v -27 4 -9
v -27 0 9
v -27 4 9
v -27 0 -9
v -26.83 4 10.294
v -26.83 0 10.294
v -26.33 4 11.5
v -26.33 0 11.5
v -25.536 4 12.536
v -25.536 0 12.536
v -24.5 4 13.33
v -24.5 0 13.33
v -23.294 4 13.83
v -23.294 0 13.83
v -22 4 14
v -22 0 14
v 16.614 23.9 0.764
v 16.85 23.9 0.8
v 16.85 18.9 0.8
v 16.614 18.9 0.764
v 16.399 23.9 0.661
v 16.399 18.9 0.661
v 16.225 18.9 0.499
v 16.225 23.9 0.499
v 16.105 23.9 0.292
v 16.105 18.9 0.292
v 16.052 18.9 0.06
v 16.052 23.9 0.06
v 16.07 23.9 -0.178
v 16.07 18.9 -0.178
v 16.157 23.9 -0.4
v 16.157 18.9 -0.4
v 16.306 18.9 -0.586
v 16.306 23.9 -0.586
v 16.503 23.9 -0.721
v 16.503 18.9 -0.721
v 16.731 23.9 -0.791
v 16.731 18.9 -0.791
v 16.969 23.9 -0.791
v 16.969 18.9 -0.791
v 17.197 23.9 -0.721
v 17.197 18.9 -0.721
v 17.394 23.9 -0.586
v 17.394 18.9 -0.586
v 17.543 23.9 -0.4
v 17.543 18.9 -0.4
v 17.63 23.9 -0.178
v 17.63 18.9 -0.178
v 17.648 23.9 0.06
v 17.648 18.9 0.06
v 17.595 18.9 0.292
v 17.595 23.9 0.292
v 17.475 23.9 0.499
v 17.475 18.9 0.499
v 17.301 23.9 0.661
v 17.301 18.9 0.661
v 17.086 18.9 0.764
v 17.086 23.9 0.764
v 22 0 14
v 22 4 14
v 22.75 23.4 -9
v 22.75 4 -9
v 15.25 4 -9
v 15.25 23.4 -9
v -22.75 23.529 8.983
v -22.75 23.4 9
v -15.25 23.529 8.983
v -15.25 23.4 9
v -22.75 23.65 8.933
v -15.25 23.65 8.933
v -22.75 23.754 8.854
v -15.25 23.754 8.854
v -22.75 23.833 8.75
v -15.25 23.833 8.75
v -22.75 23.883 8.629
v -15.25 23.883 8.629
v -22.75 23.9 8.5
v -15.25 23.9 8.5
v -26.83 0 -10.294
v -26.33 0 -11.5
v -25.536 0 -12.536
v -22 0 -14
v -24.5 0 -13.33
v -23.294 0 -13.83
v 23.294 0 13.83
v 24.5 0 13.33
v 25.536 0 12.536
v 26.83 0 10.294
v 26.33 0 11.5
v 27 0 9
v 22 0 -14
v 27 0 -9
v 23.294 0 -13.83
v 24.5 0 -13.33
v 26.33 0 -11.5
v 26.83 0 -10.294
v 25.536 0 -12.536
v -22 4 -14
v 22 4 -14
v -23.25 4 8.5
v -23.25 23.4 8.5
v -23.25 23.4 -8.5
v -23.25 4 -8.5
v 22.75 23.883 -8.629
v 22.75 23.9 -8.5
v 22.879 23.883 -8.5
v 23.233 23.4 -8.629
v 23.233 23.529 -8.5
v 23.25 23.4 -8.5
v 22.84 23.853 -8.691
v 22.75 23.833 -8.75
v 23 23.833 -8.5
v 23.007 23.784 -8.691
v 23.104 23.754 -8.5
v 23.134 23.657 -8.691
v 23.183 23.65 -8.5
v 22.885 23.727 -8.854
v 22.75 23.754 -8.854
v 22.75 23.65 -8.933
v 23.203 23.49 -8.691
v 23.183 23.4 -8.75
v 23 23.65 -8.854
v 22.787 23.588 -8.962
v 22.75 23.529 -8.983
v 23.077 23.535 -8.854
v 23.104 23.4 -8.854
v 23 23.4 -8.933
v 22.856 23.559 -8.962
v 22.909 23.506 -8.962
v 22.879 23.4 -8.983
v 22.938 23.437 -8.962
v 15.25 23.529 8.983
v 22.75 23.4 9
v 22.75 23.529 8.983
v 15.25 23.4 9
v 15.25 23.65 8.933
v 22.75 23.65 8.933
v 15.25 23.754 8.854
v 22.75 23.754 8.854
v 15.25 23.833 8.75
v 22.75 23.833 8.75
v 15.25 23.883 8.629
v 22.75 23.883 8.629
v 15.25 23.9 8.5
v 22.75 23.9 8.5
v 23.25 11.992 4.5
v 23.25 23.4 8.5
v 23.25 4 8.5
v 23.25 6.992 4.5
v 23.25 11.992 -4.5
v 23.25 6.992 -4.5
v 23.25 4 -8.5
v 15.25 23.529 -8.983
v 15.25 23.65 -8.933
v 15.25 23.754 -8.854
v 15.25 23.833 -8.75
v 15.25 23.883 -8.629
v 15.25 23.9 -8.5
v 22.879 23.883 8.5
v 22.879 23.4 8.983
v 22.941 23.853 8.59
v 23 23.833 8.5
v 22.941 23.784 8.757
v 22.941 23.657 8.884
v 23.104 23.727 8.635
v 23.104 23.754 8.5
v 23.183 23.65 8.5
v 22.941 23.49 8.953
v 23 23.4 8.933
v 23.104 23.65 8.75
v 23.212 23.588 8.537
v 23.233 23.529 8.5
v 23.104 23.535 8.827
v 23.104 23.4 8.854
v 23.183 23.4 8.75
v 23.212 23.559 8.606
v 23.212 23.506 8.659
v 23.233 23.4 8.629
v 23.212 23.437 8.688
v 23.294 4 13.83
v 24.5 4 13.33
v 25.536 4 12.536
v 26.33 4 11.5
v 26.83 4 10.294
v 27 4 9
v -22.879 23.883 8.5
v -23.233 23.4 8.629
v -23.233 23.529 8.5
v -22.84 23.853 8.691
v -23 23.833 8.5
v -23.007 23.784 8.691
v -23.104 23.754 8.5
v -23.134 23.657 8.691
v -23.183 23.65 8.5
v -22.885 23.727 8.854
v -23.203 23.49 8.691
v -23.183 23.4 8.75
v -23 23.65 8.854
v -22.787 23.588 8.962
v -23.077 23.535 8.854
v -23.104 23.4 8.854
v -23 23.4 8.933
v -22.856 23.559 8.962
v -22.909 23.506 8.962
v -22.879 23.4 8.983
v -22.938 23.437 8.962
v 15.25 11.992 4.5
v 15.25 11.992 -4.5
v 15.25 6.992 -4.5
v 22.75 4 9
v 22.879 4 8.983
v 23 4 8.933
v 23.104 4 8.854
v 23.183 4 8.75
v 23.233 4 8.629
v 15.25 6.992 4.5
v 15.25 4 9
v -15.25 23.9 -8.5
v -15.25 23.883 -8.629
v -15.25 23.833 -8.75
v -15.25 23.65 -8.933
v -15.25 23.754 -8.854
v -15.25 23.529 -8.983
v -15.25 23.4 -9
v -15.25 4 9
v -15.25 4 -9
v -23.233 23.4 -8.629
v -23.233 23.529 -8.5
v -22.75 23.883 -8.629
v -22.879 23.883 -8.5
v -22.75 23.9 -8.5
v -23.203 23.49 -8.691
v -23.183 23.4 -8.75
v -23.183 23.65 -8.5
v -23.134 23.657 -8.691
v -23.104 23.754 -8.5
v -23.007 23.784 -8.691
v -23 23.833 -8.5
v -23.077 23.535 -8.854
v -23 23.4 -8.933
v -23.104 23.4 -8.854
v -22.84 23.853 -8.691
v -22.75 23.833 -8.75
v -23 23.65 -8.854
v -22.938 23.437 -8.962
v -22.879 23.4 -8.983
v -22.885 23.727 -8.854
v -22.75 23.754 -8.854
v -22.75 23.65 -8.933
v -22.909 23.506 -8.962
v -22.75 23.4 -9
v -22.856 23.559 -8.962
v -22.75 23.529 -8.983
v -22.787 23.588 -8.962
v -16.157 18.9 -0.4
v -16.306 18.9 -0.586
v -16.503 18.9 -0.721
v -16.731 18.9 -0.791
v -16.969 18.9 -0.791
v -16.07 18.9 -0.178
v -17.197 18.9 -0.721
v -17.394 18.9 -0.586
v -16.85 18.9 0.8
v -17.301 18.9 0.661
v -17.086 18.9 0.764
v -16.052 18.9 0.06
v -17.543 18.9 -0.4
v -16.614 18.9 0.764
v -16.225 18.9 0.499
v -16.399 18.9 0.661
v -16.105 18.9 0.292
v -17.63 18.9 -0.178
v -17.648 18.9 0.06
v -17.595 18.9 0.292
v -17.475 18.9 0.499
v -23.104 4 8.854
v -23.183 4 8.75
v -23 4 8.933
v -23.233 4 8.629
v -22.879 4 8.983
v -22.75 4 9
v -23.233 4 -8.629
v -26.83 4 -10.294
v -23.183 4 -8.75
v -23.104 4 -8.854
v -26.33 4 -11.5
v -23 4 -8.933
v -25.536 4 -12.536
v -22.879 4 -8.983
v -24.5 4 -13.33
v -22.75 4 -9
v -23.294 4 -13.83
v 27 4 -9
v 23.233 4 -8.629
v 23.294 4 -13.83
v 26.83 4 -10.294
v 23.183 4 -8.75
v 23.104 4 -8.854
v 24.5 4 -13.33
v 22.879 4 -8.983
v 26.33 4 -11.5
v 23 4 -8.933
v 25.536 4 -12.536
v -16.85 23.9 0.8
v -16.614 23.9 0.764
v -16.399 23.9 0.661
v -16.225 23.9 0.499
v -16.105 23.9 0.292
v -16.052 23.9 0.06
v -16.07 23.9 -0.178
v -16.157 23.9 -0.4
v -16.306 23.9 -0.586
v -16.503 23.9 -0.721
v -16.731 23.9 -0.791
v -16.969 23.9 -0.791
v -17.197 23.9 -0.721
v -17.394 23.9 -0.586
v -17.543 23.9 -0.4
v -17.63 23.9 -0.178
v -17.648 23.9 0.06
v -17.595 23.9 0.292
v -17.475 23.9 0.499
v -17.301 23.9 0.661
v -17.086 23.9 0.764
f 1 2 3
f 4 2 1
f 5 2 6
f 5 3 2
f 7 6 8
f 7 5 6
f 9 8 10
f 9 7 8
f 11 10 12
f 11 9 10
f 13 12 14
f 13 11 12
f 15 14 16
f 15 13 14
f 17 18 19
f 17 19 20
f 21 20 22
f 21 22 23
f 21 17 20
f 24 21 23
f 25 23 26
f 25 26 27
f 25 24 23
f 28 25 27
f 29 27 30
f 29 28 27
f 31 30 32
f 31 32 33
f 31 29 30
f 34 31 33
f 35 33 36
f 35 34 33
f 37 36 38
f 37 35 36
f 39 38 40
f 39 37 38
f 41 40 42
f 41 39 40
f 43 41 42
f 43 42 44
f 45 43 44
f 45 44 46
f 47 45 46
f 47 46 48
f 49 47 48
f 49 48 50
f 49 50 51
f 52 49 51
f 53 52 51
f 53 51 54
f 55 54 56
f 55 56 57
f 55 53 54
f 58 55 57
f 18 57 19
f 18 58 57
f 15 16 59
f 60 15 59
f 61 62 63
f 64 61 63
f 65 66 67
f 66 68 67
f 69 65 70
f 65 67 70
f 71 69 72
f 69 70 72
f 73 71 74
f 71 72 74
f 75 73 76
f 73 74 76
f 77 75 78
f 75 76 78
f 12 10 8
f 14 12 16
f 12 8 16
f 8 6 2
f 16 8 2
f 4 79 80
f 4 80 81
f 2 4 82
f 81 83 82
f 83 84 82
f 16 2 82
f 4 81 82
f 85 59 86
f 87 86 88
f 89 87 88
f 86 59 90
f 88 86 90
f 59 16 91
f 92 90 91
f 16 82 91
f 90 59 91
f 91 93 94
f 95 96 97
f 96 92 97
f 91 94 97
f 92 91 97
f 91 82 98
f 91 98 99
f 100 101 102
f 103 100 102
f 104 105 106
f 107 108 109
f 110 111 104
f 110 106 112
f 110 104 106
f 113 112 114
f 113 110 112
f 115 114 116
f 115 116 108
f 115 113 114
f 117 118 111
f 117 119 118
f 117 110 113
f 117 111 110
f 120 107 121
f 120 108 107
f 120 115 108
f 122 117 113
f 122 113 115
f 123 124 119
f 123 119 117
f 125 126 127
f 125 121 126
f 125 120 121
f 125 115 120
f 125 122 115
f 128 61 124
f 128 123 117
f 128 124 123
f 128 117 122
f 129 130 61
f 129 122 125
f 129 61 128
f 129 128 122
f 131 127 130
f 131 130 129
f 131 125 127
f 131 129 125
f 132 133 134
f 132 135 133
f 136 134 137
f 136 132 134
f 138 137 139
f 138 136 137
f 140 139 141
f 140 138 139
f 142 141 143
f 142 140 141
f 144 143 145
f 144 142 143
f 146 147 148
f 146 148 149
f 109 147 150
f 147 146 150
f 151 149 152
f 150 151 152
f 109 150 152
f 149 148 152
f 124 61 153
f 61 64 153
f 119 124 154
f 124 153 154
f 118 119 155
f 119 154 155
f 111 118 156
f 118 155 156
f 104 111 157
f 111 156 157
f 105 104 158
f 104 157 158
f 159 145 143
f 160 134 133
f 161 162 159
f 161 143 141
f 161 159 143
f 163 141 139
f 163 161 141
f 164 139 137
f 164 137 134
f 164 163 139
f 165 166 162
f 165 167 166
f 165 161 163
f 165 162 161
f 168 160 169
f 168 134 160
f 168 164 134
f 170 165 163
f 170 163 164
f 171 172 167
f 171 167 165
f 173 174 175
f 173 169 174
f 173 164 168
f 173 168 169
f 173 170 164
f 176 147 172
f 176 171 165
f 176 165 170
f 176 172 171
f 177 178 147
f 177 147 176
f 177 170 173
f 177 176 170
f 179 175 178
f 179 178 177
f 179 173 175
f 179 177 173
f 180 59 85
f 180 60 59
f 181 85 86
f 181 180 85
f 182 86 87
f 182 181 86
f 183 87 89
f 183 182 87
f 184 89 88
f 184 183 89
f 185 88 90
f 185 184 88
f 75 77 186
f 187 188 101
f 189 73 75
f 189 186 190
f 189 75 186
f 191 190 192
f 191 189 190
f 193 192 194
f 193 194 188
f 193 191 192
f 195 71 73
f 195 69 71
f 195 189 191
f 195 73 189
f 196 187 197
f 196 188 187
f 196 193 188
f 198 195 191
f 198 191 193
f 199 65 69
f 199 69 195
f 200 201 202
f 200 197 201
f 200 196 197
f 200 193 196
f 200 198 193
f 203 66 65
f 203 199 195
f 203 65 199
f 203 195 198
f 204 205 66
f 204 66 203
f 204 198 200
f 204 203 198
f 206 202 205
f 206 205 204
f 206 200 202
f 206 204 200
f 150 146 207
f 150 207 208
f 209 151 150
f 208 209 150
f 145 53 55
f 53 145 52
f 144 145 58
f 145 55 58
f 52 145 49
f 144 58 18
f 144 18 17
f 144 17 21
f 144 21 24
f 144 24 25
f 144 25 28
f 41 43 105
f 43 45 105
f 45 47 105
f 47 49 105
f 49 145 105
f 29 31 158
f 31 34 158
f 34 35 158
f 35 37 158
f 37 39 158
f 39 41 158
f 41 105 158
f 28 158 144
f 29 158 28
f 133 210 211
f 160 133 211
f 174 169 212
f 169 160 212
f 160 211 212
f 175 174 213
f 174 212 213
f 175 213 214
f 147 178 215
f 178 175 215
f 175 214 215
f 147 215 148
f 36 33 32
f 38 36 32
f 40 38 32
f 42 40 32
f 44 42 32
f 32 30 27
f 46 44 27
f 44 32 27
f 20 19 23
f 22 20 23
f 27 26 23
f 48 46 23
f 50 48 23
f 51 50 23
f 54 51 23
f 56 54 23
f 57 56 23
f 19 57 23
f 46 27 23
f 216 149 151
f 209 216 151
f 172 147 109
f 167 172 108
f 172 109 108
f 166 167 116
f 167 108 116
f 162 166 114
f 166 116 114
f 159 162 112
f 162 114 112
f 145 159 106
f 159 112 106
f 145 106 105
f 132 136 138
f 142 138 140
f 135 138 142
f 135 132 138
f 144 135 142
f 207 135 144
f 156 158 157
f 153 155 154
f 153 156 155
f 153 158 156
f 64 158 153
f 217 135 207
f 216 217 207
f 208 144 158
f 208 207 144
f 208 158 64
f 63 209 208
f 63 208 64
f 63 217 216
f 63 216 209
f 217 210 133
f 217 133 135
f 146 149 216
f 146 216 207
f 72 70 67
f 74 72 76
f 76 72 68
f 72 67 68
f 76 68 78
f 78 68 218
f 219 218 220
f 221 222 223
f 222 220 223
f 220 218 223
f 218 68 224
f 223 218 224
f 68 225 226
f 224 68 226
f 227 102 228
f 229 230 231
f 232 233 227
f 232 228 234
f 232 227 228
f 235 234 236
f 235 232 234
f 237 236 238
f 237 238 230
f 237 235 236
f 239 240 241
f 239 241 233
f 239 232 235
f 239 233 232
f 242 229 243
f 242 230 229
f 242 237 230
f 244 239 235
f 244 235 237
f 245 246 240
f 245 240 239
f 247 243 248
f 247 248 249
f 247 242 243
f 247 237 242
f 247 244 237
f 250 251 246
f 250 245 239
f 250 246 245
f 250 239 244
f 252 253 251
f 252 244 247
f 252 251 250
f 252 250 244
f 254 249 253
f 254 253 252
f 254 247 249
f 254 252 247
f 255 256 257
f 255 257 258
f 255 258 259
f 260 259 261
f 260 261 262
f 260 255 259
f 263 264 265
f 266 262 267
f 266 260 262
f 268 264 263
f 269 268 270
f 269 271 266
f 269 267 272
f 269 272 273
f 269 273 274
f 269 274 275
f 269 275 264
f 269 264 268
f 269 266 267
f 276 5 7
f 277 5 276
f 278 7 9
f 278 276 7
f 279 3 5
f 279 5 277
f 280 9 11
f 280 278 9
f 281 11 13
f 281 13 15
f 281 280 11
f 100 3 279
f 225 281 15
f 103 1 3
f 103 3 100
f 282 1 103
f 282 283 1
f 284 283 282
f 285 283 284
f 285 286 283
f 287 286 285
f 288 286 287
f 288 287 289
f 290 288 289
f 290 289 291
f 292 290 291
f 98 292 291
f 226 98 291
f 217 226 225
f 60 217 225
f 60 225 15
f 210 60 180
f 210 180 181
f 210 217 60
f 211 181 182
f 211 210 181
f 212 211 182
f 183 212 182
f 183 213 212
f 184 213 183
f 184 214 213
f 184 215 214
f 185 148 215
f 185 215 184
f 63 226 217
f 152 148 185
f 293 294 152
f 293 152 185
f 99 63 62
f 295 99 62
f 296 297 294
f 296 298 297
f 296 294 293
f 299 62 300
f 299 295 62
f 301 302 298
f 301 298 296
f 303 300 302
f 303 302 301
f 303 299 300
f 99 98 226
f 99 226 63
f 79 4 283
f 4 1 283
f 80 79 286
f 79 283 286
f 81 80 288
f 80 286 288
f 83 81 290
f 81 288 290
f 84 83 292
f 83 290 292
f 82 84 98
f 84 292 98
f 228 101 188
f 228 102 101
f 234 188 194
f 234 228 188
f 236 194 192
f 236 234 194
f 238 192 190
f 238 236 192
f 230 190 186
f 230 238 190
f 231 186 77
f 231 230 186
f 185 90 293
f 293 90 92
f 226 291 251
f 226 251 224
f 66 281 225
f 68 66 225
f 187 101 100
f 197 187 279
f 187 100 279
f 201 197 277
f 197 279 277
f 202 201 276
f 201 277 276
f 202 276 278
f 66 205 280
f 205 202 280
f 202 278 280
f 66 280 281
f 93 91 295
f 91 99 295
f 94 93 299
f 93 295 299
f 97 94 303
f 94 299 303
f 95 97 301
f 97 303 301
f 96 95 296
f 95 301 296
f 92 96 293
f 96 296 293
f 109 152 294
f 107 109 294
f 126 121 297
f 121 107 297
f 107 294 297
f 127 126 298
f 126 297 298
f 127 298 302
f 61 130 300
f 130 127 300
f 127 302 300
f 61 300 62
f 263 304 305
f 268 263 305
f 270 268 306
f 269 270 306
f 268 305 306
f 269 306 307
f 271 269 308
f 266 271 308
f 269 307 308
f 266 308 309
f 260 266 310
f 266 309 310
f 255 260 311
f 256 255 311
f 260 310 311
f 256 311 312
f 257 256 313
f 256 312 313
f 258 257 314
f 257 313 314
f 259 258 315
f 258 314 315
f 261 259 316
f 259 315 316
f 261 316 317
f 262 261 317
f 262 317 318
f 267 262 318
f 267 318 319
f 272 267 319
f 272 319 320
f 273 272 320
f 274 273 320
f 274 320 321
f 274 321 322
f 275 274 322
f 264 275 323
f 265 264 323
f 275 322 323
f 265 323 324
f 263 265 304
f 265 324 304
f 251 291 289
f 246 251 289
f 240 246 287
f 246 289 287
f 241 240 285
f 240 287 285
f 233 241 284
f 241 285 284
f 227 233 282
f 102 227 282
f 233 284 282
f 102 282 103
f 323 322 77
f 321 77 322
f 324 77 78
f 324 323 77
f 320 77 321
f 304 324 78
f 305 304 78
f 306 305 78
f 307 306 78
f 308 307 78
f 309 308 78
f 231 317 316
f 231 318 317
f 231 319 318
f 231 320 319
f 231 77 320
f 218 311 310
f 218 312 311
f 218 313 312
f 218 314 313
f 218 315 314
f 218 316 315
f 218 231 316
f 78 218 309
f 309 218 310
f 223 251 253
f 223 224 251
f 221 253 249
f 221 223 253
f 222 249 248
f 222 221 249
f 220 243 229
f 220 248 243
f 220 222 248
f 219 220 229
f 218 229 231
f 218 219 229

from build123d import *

# Parameters (mm, degrees)
SKETCH1_W           = 54
SKETCH1_H           = 28
BOSS_EXTRUDE1_DEPTH = 4
SKETCH4_W           = 8
SKETCH4_H           = 18
BOSS_EXTRUDE3_DEPTH = 19.9
FILLET1_R           = 5
SKETCH5_R           = 0.8
CUT_EXTRUDE1_DEPTH  = 5
SKETCH6_W           = 9
SKETCH6_H           = 5
CUT_EXTRUDE2_DEPTH  = 13
FILLET4_R           = 0.5
FILLET5_R           = 0.5


with BuildPart() as part:
    # Sketch1 → Boss-Extrude1 (new body)
    with BuildSketch(Plane(origin=(0, 0, 0), x_dir=(1, 0, 0), z_dir=(0, 1, 0))):
        Rectangle(SKETCH1_W, SKETCH1_H)
    extrude(amount=BOSS_EXTRUDE1_DEPTH)

    # Sketch4 → Boss-Extrude3 (add)
    with BuildSketch(Plane(origin=(0, 4, 0), x_dir=(1, 0, 0), z_dir=(0, 1, 0))):
        with Locations((-19.25, 0)):
            Rectangle(SKETCH4_W, SKETCH4_H)
    boss_extrude3 = extrude(amount=BOSS_EXTRUDE3_DEPTH)

    # Mirror2: Boss-Extrude3 across plane
    add(boss_extrude3.mirror(Plane(origin=(0, 0, 0), x_dir=(0, 0, 1), z_dir=(1, 0, 0))))

    # Fillet1
    fillet1_edges = [part.edges().sort_by_distance(p)[0] for p in [
        (27, 2, 14),
        (-27, 2, 14),
        (-27, 2, -14),
        (27, 2, -14),
    ]]
    fillet(fillet1_edges, radius=FILLET1_R)

    # Sketch5 → Cut-Extrude1 (cut)
    with BuildSketch(Plane(origin=(0, 23.9, 0), x_dir=(1, 0, 0), z_dir=(0, 1, 0))):
        with Locations(Location((-16.85, 0, 0), (0, 0, 270))):
            Circle(SKETCH5_R)
    cut_extrude1 = extrude(amount=-CUT_EXTRUDE1_DEPTH, mode=Mode.SUBTRACT)

    # Mirror3: Cut-Extrude1 across plane
    add(cut_extrude1.mirror(Plane(origin=(0, 0, 0), x_dir=(0, 0, 1), z_dir=(1, 0, 0))), mode=Mode.SUBTRACT)

    # Sketch6 → Cut-Extrude2 (cut)
    with BuildSketch(Plane(origin=(23.25, 0, 0), x_dir=(0, 0, -1), z_dir=(1, 0, 0))):
        with Locations((0, 9.492209163)):
            Rectangle(SKETCH6_W, SKETCH6_H)
    extrude(amount=-CUT_EXTRUDE2_DEPTH, mode=Mode.SUBTRACT)

    # Fillet4
    fillet4_edges = [part.edges().sort_by_distance(p)[0] for p in [
        (-19.25, 23.9, -9),
        (-23.25, 23.9, 0),
        (-19.25, 23.9, 9),
        (19.25, 23.9, 9),
        (23.25, 23.9, 0),
        (19.25, 23.9, -9),
    ]]
    fillet(fillet4_edges, radius=FILLET4_R)

    # Fillet5
    # the kernel refuses this fillet: 0.5 mm, written as the material it takes off along each edge
    with BuildSketch(Plane(origin=(-22.75, 23.4, 8.5), x_dir=(-1, 0, 0), z_dir=(0, 0, 1))) as fillet5_piece_1_section:
        Polygon((0, 0), (FILLET5_R, 0), (FILLET5_R, -FILLET5_R), (0, -FILLET5_R), align=None)
    fillet5_piece_1 = extrude(amount=FILLET5_R, mode=Mode.PRIVATE)
    fillet5_piece_1 = fillet5_piece_1 - Plane(origin=(-22.75, 23.4, 8.5), x_dir=(0.7071067811865475, -0.7071067811865475, 0), z_dir=(0, 0, 1)) * Sphere(FILLET5_R, mode=Mode.PRIVATE)
    add(fillet5_piece_1, mode=Mode.SUBTRACT)
    with BuildSketch(Plane(origin=(-22.75, 23.4, -8.5), x_dir=(-1, 0, 0), z_dir=(0, 0, -1))) as fillet5_piece_2_section:
        Polygon((0, 0), (FILLET5_R, 0), (FILLET5_R, FILLET5_R), (0, FILLET5_R), align=None)
    fillet5_piece_2 = extrude(amount=FILLET5_R, mode=Mode.PRIVATE)
    fillet5_piece_2 = fillet5_piece_2 - Plane(origin=(-22.75, 23.4, -8.5), x_dir=(0.7071067811865475, -0.7071067811865475, 0), z_dir=(0, 0, -1)) * Sphere(FILLET5_R, mode=Mode.PRIVATE)
    add(fillet5_piece_2, mode=Mode.SUBTRACT)
    with BuildSketch(Plane(origin=(22.75, 23.4, -8.5), x_dir=(1, 0, 0), z_dir=(0, 0, -1))) as fillet5_piece_3_section:
        Polygon((0, 0), (FILLET5_R, 0), (FILLET5_R, -FILLET5_R), (0, -FILLET5_R), align=None)
    fillet5_piece_3 = extrude(amount=FILLET5_R, mode=Mode.PRIVATE)
    fillet5_piece_3 = fillet5_piece_3 - Plane(origin=(22.75, 23.4, -8.5), x_dir=(-0.7071067811865475, -0.7071067811865475, 0), z_dir=(0, 0, -1)) * Sphere(FILLET5_R, mode=Mode.PRIVATE)
    add(fillet5_piece_3, mode=Mode.SUBTRACT)
    with BuildSketch(Plane(origin=(22.75, 23.4, 8.5), x_dir=(0, 0, 1), z_dir=(1, 0, 0))) as fillet5_piece_4_section:
        Polygon((0, 0), (FILLET5_R, 0), (FILLET5_R, -FILLET5_R), (0, -FILLET5_R), align=None)
    fillet5_piece_4 = extrude(amount=FILLET5_R, mode=Mode.PRIVATE)
    fillet5_piece_4 = fillet5_piece_4 - Plane(origin=(22.75, 23.4, 8.5), x_dir=(0, -0.7071067811865475, -0.7071067811865475), z_dir=(1, 0, 0)) * Sphere(FILLET5_R, mode=Mode.PRIVATE)
    add(fillet5_piece_4, mode=Mode.SUBTRACT)
    with BuildSketch(Plane(origin=(-23.25, 4, -9), x_dir=(1, 0, 0), z_dir=(0, 1, 0))) as fillet5_piece_5:
        with BuildLine():
            CenterArc((FILLET5_R, -FILLET5_R), FILLET5_R, 90, 90)
            Line((0, -FILLET5_R), (0, 0))
            Line((0, 0), (FILLET5_R, 0))
        make_face()
    extrude(amount=19.4, mode=Mode.SUBTRACT)
    with BuildSketch(Plane(origin=(-23.25, 4, 9), x_dir=(1, 0, 0), z_dir=(0, 1, 0)), Plane(origin=(23.25, 4, 9), x_dir=(0, 0, -1), z_dir=(0, 1, 0)), Plane(origin=(23.25, 4, -9), x_dir=(-1, 0, 0), z_dir=(0, 1, 0))) as fillet5_piece_6:
        with BuildLine():
            CenterArc((FILLET5_R, FILLET5_R), FILLET5_R, 180, 90)
            Line((0, FILLET5_R), (0, 0))
            Line((0, 0), (FILLET5_R, 0))
        make_face()
    extrude(amount=19.4, mode=Mode.SUBTRACT)


solid = part.part
